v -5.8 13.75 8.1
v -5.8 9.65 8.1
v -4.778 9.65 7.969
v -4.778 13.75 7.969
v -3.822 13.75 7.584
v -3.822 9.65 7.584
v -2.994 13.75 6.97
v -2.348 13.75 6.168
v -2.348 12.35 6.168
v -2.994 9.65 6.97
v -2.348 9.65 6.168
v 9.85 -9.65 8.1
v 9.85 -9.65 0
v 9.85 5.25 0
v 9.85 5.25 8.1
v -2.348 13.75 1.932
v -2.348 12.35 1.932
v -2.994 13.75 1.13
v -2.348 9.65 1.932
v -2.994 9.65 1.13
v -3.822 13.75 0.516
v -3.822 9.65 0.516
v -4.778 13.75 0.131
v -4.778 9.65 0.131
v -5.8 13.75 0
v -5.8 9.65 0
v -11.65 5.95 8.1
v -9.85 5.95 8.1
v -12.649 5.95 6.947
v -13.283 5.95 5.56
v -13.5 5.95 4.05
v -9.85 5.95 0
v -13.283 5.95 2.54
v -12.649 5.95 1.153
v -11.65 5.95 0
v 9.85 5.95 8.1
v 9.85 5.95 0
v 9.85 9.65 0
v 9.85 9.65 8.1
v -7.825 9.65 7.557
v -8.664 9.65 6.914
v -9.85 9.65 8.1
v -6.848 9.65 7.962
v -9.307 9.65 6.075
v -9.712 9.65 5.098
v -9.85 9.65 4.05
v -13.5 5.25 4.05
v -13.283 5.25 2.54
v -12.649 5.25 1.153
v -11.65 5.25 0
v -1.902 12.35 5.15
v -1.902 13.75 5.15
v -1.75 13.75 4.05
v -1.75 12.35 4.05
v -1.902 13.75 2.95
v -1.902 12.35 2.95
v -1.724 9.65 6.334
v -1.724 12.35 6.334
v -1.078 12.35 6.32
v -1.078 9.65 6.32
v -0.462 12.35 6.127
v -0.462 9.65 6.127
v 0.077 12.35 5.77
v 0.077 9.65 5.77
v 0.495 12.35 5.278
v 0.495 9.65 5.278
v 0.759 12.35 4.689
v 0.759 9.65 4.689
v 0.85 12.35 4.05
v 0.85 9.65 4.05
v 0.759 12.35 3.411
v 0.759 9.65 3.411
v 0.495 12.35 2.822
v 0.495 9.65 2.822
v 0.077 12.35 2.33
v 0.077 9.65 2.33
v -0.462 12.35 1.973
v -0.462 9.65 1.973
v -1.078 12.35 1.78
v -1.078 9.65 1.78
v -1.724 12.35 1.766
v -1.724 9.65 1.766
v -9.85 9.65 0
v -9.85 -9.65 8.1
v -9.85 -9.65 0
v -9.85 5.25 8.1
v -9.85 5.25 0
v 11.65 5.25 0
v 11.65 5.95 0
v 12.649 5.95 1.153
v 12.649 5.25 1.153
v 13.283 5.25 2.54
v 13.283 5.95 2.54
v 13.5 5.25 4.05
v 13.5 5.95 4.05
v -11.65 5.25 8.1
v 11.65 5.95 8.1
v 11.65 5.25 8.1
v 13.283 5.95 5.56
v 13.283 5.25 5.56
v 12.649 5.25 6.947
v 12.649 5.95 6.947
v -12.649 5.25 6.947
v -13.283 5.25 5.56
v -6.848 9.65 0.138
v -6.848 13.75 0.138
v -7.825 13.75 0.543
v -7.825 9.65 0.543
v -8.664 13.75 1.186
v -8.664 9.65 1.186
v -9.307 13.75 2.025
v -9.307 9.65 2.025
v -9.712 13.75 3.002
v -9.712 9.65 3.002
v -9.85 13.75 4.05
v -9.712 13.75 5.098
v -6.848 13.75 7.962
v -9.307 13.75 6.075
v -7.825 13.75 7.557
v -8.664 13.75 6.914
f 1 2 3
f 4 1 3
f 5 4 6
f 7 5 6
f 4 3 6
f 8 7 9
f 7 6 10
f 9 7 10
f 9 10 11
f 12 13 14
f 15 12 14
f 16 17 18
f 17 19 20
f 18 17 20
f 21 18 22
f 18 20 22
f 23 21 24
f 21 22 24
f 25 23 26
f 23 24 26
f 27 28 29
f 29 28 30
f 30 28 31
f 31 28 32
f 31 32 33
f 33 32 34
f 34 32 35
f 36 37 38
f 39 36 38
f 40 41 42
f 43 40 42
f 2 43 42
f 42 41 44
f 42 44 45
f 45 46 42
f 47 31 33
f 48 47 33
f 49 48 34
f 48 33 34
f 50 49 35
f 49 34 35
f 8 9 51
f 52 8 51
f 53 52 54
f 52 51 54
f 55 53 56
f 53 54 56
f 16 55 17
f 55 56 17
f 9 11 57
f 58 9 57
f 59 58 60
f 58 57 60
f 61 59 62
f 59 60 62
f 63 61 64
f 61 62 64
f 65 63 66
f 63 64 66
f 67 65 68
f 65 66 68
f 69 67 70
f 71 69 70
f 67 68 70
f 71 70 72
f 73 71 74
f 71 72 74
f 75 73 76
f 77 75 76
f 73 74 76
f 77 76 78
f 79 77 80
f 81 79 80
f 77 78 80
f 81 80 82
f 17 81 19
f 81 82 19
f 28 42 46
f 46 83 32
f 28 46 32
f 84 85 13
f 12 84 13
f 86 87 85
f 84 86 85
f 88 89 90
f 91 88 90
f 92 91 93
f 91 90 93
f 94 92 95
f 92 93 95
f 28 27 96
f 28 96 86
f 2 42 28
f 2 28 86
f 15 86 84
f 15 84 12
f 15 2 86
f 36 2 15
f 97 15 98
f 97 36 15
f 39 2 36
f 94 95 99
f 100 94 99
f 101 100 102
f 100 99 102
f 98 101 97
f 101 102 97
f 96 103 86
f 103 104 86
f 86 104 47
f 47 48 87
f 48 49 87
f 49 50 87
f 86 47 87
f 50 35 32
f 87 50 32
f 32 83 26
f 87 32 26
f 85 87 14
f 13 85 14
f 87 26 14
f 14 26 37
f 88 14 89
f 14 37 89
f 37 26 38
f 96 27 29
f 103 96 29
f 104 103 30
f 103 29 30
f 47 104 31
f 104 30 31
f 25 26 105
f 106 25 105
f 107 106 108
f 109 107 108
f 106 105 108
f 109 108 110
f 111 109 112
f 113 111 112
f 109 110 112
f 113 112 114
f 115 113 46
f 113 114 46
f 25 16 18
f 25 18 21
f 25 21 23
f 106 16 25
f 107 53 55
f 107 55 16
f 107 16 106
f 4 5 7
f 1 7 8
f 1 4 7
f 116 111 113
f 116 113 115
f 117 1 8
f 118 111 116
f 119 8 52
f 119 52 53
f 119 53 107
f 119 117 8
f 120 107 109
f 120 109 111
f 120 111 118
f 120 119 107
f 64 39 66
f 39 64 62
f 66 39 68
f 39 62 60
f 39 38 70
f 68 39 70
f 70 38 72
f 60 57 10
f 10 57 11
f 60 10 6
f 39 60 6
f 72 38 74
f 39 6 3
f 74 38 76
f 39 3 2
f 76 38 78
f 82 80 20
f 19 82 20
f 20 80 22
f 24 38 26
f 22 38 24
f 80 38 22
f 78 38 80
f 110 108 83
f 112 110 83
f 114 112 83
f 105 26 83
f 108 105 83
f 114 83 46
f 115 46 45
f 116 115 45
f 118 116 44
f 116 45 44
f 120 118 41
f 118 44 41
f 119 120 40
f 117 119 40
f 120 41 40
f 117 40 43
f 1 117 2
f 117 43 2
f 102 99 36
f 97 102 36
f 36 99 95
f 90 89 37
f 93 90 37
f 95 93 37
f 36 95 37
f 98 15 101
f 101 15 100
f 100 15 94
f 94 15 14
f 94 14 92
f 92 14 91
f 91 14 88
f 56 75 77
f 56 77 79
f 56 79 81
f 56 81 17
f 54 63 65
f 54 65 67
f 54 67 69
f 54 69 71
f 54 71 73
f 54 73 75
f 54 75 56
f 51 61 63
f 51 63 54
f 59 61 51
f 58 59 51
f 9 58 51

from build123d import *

# Parameters (mm, degrees)
F1_DEPTH = 8.1
F3_DEPTH = 0.7
F5_DEPTH = 4.1
F6_DEPTH = 2.7


with BuildPart() as f1:
    # F0 (on Top) → F1 (new body)
    with BuildSketch(Plane.XY):
        Polygon((-9.85, -9.65), (9.85, -9.65), (9.85, 5.25), (13.5, 5.25), (13.5, 5.95), (9.85, 5.95), (9.85, 9.65), (-9.85, 9.65), (-9.85, 5.95), (-13.5, 5.95), (-13.5, 5.25), (-9.85, 5.25), align=None)
    extrude(amount=F1_DEPTH)

    # F2 (on face) → F3 (cut, through all)
    with BuildSketch(Plane(origin=(0, 5.95, 0), x_dir=(-1, 0, 0), z_dir=(0, 1, 0))):
        with BuildLine():
            ThreePointArc((-11.65, 0), (-13.015604, 1.823736), (-13.5, 4.05))
            Line((-13.5, 4.05), (-13.5, 0))
            Line((-13.5, 0), (-11.65, 0))
        make_face()
        with BuildLine():
            ThreePointArc((-13.5, 4.05), (-13.015604, 6.276264), (-11.65, 8.1))
            Line((-11.65, 8.1), (-13.5, 8.1))
            Line((-13.5, 8.1), (-13.5, 4.05))
        make_face()
        with BuildLine():
            Line((13.5, 8.1), (11.65, 8.1))
            ThreePointArc((11.65, 8.1), (13.015604, 6.276264), (13.5, 4.05))
            Line((13.5, 4.05), (13.5, 8.1))
        make_face()
        with BuildLine():
            Line((13.5, 0), (13.5, 4.05))
            ThreePointArc((13.5, 4.05), (13.015604, 1.823736), (11.65, 0))
            Line((11.65, 0), (13.5, 0))
        make_face()
    extrude(amount=-F3_DEPTH, mode=Mode.SUBTRACT)

    # F4 (on face) → F5 (join)
    with BuildSketch(Plane(origin=(0, 9.65, 0), x_dir=(-1, 0, 0), z_dir=(0, 1, 0))):
        with BuildLine():
            ThreePointArc((5.8, 8.1), (3.82183, 7.584027), (2.347701, 6.167577))
            ThreePointArc((2.347701, 6.167577), (1.75, 4.05), (2.347701, 1.932423))
            ThreePointArc((2.347701, 1.932423), (3.82183, 0.515973), (5.8, 0))
            ThreePointArc((5.8, 0), (8.663782, 1.186218), (9.85, 4.05))
            ThreePointArc((9.85, 4.05), (8.663782, 6.913782), (5.8, 8.1))
        make_face()
    extrude(amount=F5_DEPTH)

    # F4 (on face) → F6 (join)
    with BuildSketch(Plane(origin=(0, 9.65, 0), x_dir=(-1, 0, 0), z_dir=(0, 1, 0))):
        with BuildLine():
            ThreePointArc((2.347701, 1.932423), (1.75, 4.05), (2.347701, 6.167577))
            ThreePointArc((2.347701, 6.167577), (-0.85, 4.05), (2.347701, 1.932423))
        make_face()
    extrude(amount=F6_DEPTH)


solid = f1.part
